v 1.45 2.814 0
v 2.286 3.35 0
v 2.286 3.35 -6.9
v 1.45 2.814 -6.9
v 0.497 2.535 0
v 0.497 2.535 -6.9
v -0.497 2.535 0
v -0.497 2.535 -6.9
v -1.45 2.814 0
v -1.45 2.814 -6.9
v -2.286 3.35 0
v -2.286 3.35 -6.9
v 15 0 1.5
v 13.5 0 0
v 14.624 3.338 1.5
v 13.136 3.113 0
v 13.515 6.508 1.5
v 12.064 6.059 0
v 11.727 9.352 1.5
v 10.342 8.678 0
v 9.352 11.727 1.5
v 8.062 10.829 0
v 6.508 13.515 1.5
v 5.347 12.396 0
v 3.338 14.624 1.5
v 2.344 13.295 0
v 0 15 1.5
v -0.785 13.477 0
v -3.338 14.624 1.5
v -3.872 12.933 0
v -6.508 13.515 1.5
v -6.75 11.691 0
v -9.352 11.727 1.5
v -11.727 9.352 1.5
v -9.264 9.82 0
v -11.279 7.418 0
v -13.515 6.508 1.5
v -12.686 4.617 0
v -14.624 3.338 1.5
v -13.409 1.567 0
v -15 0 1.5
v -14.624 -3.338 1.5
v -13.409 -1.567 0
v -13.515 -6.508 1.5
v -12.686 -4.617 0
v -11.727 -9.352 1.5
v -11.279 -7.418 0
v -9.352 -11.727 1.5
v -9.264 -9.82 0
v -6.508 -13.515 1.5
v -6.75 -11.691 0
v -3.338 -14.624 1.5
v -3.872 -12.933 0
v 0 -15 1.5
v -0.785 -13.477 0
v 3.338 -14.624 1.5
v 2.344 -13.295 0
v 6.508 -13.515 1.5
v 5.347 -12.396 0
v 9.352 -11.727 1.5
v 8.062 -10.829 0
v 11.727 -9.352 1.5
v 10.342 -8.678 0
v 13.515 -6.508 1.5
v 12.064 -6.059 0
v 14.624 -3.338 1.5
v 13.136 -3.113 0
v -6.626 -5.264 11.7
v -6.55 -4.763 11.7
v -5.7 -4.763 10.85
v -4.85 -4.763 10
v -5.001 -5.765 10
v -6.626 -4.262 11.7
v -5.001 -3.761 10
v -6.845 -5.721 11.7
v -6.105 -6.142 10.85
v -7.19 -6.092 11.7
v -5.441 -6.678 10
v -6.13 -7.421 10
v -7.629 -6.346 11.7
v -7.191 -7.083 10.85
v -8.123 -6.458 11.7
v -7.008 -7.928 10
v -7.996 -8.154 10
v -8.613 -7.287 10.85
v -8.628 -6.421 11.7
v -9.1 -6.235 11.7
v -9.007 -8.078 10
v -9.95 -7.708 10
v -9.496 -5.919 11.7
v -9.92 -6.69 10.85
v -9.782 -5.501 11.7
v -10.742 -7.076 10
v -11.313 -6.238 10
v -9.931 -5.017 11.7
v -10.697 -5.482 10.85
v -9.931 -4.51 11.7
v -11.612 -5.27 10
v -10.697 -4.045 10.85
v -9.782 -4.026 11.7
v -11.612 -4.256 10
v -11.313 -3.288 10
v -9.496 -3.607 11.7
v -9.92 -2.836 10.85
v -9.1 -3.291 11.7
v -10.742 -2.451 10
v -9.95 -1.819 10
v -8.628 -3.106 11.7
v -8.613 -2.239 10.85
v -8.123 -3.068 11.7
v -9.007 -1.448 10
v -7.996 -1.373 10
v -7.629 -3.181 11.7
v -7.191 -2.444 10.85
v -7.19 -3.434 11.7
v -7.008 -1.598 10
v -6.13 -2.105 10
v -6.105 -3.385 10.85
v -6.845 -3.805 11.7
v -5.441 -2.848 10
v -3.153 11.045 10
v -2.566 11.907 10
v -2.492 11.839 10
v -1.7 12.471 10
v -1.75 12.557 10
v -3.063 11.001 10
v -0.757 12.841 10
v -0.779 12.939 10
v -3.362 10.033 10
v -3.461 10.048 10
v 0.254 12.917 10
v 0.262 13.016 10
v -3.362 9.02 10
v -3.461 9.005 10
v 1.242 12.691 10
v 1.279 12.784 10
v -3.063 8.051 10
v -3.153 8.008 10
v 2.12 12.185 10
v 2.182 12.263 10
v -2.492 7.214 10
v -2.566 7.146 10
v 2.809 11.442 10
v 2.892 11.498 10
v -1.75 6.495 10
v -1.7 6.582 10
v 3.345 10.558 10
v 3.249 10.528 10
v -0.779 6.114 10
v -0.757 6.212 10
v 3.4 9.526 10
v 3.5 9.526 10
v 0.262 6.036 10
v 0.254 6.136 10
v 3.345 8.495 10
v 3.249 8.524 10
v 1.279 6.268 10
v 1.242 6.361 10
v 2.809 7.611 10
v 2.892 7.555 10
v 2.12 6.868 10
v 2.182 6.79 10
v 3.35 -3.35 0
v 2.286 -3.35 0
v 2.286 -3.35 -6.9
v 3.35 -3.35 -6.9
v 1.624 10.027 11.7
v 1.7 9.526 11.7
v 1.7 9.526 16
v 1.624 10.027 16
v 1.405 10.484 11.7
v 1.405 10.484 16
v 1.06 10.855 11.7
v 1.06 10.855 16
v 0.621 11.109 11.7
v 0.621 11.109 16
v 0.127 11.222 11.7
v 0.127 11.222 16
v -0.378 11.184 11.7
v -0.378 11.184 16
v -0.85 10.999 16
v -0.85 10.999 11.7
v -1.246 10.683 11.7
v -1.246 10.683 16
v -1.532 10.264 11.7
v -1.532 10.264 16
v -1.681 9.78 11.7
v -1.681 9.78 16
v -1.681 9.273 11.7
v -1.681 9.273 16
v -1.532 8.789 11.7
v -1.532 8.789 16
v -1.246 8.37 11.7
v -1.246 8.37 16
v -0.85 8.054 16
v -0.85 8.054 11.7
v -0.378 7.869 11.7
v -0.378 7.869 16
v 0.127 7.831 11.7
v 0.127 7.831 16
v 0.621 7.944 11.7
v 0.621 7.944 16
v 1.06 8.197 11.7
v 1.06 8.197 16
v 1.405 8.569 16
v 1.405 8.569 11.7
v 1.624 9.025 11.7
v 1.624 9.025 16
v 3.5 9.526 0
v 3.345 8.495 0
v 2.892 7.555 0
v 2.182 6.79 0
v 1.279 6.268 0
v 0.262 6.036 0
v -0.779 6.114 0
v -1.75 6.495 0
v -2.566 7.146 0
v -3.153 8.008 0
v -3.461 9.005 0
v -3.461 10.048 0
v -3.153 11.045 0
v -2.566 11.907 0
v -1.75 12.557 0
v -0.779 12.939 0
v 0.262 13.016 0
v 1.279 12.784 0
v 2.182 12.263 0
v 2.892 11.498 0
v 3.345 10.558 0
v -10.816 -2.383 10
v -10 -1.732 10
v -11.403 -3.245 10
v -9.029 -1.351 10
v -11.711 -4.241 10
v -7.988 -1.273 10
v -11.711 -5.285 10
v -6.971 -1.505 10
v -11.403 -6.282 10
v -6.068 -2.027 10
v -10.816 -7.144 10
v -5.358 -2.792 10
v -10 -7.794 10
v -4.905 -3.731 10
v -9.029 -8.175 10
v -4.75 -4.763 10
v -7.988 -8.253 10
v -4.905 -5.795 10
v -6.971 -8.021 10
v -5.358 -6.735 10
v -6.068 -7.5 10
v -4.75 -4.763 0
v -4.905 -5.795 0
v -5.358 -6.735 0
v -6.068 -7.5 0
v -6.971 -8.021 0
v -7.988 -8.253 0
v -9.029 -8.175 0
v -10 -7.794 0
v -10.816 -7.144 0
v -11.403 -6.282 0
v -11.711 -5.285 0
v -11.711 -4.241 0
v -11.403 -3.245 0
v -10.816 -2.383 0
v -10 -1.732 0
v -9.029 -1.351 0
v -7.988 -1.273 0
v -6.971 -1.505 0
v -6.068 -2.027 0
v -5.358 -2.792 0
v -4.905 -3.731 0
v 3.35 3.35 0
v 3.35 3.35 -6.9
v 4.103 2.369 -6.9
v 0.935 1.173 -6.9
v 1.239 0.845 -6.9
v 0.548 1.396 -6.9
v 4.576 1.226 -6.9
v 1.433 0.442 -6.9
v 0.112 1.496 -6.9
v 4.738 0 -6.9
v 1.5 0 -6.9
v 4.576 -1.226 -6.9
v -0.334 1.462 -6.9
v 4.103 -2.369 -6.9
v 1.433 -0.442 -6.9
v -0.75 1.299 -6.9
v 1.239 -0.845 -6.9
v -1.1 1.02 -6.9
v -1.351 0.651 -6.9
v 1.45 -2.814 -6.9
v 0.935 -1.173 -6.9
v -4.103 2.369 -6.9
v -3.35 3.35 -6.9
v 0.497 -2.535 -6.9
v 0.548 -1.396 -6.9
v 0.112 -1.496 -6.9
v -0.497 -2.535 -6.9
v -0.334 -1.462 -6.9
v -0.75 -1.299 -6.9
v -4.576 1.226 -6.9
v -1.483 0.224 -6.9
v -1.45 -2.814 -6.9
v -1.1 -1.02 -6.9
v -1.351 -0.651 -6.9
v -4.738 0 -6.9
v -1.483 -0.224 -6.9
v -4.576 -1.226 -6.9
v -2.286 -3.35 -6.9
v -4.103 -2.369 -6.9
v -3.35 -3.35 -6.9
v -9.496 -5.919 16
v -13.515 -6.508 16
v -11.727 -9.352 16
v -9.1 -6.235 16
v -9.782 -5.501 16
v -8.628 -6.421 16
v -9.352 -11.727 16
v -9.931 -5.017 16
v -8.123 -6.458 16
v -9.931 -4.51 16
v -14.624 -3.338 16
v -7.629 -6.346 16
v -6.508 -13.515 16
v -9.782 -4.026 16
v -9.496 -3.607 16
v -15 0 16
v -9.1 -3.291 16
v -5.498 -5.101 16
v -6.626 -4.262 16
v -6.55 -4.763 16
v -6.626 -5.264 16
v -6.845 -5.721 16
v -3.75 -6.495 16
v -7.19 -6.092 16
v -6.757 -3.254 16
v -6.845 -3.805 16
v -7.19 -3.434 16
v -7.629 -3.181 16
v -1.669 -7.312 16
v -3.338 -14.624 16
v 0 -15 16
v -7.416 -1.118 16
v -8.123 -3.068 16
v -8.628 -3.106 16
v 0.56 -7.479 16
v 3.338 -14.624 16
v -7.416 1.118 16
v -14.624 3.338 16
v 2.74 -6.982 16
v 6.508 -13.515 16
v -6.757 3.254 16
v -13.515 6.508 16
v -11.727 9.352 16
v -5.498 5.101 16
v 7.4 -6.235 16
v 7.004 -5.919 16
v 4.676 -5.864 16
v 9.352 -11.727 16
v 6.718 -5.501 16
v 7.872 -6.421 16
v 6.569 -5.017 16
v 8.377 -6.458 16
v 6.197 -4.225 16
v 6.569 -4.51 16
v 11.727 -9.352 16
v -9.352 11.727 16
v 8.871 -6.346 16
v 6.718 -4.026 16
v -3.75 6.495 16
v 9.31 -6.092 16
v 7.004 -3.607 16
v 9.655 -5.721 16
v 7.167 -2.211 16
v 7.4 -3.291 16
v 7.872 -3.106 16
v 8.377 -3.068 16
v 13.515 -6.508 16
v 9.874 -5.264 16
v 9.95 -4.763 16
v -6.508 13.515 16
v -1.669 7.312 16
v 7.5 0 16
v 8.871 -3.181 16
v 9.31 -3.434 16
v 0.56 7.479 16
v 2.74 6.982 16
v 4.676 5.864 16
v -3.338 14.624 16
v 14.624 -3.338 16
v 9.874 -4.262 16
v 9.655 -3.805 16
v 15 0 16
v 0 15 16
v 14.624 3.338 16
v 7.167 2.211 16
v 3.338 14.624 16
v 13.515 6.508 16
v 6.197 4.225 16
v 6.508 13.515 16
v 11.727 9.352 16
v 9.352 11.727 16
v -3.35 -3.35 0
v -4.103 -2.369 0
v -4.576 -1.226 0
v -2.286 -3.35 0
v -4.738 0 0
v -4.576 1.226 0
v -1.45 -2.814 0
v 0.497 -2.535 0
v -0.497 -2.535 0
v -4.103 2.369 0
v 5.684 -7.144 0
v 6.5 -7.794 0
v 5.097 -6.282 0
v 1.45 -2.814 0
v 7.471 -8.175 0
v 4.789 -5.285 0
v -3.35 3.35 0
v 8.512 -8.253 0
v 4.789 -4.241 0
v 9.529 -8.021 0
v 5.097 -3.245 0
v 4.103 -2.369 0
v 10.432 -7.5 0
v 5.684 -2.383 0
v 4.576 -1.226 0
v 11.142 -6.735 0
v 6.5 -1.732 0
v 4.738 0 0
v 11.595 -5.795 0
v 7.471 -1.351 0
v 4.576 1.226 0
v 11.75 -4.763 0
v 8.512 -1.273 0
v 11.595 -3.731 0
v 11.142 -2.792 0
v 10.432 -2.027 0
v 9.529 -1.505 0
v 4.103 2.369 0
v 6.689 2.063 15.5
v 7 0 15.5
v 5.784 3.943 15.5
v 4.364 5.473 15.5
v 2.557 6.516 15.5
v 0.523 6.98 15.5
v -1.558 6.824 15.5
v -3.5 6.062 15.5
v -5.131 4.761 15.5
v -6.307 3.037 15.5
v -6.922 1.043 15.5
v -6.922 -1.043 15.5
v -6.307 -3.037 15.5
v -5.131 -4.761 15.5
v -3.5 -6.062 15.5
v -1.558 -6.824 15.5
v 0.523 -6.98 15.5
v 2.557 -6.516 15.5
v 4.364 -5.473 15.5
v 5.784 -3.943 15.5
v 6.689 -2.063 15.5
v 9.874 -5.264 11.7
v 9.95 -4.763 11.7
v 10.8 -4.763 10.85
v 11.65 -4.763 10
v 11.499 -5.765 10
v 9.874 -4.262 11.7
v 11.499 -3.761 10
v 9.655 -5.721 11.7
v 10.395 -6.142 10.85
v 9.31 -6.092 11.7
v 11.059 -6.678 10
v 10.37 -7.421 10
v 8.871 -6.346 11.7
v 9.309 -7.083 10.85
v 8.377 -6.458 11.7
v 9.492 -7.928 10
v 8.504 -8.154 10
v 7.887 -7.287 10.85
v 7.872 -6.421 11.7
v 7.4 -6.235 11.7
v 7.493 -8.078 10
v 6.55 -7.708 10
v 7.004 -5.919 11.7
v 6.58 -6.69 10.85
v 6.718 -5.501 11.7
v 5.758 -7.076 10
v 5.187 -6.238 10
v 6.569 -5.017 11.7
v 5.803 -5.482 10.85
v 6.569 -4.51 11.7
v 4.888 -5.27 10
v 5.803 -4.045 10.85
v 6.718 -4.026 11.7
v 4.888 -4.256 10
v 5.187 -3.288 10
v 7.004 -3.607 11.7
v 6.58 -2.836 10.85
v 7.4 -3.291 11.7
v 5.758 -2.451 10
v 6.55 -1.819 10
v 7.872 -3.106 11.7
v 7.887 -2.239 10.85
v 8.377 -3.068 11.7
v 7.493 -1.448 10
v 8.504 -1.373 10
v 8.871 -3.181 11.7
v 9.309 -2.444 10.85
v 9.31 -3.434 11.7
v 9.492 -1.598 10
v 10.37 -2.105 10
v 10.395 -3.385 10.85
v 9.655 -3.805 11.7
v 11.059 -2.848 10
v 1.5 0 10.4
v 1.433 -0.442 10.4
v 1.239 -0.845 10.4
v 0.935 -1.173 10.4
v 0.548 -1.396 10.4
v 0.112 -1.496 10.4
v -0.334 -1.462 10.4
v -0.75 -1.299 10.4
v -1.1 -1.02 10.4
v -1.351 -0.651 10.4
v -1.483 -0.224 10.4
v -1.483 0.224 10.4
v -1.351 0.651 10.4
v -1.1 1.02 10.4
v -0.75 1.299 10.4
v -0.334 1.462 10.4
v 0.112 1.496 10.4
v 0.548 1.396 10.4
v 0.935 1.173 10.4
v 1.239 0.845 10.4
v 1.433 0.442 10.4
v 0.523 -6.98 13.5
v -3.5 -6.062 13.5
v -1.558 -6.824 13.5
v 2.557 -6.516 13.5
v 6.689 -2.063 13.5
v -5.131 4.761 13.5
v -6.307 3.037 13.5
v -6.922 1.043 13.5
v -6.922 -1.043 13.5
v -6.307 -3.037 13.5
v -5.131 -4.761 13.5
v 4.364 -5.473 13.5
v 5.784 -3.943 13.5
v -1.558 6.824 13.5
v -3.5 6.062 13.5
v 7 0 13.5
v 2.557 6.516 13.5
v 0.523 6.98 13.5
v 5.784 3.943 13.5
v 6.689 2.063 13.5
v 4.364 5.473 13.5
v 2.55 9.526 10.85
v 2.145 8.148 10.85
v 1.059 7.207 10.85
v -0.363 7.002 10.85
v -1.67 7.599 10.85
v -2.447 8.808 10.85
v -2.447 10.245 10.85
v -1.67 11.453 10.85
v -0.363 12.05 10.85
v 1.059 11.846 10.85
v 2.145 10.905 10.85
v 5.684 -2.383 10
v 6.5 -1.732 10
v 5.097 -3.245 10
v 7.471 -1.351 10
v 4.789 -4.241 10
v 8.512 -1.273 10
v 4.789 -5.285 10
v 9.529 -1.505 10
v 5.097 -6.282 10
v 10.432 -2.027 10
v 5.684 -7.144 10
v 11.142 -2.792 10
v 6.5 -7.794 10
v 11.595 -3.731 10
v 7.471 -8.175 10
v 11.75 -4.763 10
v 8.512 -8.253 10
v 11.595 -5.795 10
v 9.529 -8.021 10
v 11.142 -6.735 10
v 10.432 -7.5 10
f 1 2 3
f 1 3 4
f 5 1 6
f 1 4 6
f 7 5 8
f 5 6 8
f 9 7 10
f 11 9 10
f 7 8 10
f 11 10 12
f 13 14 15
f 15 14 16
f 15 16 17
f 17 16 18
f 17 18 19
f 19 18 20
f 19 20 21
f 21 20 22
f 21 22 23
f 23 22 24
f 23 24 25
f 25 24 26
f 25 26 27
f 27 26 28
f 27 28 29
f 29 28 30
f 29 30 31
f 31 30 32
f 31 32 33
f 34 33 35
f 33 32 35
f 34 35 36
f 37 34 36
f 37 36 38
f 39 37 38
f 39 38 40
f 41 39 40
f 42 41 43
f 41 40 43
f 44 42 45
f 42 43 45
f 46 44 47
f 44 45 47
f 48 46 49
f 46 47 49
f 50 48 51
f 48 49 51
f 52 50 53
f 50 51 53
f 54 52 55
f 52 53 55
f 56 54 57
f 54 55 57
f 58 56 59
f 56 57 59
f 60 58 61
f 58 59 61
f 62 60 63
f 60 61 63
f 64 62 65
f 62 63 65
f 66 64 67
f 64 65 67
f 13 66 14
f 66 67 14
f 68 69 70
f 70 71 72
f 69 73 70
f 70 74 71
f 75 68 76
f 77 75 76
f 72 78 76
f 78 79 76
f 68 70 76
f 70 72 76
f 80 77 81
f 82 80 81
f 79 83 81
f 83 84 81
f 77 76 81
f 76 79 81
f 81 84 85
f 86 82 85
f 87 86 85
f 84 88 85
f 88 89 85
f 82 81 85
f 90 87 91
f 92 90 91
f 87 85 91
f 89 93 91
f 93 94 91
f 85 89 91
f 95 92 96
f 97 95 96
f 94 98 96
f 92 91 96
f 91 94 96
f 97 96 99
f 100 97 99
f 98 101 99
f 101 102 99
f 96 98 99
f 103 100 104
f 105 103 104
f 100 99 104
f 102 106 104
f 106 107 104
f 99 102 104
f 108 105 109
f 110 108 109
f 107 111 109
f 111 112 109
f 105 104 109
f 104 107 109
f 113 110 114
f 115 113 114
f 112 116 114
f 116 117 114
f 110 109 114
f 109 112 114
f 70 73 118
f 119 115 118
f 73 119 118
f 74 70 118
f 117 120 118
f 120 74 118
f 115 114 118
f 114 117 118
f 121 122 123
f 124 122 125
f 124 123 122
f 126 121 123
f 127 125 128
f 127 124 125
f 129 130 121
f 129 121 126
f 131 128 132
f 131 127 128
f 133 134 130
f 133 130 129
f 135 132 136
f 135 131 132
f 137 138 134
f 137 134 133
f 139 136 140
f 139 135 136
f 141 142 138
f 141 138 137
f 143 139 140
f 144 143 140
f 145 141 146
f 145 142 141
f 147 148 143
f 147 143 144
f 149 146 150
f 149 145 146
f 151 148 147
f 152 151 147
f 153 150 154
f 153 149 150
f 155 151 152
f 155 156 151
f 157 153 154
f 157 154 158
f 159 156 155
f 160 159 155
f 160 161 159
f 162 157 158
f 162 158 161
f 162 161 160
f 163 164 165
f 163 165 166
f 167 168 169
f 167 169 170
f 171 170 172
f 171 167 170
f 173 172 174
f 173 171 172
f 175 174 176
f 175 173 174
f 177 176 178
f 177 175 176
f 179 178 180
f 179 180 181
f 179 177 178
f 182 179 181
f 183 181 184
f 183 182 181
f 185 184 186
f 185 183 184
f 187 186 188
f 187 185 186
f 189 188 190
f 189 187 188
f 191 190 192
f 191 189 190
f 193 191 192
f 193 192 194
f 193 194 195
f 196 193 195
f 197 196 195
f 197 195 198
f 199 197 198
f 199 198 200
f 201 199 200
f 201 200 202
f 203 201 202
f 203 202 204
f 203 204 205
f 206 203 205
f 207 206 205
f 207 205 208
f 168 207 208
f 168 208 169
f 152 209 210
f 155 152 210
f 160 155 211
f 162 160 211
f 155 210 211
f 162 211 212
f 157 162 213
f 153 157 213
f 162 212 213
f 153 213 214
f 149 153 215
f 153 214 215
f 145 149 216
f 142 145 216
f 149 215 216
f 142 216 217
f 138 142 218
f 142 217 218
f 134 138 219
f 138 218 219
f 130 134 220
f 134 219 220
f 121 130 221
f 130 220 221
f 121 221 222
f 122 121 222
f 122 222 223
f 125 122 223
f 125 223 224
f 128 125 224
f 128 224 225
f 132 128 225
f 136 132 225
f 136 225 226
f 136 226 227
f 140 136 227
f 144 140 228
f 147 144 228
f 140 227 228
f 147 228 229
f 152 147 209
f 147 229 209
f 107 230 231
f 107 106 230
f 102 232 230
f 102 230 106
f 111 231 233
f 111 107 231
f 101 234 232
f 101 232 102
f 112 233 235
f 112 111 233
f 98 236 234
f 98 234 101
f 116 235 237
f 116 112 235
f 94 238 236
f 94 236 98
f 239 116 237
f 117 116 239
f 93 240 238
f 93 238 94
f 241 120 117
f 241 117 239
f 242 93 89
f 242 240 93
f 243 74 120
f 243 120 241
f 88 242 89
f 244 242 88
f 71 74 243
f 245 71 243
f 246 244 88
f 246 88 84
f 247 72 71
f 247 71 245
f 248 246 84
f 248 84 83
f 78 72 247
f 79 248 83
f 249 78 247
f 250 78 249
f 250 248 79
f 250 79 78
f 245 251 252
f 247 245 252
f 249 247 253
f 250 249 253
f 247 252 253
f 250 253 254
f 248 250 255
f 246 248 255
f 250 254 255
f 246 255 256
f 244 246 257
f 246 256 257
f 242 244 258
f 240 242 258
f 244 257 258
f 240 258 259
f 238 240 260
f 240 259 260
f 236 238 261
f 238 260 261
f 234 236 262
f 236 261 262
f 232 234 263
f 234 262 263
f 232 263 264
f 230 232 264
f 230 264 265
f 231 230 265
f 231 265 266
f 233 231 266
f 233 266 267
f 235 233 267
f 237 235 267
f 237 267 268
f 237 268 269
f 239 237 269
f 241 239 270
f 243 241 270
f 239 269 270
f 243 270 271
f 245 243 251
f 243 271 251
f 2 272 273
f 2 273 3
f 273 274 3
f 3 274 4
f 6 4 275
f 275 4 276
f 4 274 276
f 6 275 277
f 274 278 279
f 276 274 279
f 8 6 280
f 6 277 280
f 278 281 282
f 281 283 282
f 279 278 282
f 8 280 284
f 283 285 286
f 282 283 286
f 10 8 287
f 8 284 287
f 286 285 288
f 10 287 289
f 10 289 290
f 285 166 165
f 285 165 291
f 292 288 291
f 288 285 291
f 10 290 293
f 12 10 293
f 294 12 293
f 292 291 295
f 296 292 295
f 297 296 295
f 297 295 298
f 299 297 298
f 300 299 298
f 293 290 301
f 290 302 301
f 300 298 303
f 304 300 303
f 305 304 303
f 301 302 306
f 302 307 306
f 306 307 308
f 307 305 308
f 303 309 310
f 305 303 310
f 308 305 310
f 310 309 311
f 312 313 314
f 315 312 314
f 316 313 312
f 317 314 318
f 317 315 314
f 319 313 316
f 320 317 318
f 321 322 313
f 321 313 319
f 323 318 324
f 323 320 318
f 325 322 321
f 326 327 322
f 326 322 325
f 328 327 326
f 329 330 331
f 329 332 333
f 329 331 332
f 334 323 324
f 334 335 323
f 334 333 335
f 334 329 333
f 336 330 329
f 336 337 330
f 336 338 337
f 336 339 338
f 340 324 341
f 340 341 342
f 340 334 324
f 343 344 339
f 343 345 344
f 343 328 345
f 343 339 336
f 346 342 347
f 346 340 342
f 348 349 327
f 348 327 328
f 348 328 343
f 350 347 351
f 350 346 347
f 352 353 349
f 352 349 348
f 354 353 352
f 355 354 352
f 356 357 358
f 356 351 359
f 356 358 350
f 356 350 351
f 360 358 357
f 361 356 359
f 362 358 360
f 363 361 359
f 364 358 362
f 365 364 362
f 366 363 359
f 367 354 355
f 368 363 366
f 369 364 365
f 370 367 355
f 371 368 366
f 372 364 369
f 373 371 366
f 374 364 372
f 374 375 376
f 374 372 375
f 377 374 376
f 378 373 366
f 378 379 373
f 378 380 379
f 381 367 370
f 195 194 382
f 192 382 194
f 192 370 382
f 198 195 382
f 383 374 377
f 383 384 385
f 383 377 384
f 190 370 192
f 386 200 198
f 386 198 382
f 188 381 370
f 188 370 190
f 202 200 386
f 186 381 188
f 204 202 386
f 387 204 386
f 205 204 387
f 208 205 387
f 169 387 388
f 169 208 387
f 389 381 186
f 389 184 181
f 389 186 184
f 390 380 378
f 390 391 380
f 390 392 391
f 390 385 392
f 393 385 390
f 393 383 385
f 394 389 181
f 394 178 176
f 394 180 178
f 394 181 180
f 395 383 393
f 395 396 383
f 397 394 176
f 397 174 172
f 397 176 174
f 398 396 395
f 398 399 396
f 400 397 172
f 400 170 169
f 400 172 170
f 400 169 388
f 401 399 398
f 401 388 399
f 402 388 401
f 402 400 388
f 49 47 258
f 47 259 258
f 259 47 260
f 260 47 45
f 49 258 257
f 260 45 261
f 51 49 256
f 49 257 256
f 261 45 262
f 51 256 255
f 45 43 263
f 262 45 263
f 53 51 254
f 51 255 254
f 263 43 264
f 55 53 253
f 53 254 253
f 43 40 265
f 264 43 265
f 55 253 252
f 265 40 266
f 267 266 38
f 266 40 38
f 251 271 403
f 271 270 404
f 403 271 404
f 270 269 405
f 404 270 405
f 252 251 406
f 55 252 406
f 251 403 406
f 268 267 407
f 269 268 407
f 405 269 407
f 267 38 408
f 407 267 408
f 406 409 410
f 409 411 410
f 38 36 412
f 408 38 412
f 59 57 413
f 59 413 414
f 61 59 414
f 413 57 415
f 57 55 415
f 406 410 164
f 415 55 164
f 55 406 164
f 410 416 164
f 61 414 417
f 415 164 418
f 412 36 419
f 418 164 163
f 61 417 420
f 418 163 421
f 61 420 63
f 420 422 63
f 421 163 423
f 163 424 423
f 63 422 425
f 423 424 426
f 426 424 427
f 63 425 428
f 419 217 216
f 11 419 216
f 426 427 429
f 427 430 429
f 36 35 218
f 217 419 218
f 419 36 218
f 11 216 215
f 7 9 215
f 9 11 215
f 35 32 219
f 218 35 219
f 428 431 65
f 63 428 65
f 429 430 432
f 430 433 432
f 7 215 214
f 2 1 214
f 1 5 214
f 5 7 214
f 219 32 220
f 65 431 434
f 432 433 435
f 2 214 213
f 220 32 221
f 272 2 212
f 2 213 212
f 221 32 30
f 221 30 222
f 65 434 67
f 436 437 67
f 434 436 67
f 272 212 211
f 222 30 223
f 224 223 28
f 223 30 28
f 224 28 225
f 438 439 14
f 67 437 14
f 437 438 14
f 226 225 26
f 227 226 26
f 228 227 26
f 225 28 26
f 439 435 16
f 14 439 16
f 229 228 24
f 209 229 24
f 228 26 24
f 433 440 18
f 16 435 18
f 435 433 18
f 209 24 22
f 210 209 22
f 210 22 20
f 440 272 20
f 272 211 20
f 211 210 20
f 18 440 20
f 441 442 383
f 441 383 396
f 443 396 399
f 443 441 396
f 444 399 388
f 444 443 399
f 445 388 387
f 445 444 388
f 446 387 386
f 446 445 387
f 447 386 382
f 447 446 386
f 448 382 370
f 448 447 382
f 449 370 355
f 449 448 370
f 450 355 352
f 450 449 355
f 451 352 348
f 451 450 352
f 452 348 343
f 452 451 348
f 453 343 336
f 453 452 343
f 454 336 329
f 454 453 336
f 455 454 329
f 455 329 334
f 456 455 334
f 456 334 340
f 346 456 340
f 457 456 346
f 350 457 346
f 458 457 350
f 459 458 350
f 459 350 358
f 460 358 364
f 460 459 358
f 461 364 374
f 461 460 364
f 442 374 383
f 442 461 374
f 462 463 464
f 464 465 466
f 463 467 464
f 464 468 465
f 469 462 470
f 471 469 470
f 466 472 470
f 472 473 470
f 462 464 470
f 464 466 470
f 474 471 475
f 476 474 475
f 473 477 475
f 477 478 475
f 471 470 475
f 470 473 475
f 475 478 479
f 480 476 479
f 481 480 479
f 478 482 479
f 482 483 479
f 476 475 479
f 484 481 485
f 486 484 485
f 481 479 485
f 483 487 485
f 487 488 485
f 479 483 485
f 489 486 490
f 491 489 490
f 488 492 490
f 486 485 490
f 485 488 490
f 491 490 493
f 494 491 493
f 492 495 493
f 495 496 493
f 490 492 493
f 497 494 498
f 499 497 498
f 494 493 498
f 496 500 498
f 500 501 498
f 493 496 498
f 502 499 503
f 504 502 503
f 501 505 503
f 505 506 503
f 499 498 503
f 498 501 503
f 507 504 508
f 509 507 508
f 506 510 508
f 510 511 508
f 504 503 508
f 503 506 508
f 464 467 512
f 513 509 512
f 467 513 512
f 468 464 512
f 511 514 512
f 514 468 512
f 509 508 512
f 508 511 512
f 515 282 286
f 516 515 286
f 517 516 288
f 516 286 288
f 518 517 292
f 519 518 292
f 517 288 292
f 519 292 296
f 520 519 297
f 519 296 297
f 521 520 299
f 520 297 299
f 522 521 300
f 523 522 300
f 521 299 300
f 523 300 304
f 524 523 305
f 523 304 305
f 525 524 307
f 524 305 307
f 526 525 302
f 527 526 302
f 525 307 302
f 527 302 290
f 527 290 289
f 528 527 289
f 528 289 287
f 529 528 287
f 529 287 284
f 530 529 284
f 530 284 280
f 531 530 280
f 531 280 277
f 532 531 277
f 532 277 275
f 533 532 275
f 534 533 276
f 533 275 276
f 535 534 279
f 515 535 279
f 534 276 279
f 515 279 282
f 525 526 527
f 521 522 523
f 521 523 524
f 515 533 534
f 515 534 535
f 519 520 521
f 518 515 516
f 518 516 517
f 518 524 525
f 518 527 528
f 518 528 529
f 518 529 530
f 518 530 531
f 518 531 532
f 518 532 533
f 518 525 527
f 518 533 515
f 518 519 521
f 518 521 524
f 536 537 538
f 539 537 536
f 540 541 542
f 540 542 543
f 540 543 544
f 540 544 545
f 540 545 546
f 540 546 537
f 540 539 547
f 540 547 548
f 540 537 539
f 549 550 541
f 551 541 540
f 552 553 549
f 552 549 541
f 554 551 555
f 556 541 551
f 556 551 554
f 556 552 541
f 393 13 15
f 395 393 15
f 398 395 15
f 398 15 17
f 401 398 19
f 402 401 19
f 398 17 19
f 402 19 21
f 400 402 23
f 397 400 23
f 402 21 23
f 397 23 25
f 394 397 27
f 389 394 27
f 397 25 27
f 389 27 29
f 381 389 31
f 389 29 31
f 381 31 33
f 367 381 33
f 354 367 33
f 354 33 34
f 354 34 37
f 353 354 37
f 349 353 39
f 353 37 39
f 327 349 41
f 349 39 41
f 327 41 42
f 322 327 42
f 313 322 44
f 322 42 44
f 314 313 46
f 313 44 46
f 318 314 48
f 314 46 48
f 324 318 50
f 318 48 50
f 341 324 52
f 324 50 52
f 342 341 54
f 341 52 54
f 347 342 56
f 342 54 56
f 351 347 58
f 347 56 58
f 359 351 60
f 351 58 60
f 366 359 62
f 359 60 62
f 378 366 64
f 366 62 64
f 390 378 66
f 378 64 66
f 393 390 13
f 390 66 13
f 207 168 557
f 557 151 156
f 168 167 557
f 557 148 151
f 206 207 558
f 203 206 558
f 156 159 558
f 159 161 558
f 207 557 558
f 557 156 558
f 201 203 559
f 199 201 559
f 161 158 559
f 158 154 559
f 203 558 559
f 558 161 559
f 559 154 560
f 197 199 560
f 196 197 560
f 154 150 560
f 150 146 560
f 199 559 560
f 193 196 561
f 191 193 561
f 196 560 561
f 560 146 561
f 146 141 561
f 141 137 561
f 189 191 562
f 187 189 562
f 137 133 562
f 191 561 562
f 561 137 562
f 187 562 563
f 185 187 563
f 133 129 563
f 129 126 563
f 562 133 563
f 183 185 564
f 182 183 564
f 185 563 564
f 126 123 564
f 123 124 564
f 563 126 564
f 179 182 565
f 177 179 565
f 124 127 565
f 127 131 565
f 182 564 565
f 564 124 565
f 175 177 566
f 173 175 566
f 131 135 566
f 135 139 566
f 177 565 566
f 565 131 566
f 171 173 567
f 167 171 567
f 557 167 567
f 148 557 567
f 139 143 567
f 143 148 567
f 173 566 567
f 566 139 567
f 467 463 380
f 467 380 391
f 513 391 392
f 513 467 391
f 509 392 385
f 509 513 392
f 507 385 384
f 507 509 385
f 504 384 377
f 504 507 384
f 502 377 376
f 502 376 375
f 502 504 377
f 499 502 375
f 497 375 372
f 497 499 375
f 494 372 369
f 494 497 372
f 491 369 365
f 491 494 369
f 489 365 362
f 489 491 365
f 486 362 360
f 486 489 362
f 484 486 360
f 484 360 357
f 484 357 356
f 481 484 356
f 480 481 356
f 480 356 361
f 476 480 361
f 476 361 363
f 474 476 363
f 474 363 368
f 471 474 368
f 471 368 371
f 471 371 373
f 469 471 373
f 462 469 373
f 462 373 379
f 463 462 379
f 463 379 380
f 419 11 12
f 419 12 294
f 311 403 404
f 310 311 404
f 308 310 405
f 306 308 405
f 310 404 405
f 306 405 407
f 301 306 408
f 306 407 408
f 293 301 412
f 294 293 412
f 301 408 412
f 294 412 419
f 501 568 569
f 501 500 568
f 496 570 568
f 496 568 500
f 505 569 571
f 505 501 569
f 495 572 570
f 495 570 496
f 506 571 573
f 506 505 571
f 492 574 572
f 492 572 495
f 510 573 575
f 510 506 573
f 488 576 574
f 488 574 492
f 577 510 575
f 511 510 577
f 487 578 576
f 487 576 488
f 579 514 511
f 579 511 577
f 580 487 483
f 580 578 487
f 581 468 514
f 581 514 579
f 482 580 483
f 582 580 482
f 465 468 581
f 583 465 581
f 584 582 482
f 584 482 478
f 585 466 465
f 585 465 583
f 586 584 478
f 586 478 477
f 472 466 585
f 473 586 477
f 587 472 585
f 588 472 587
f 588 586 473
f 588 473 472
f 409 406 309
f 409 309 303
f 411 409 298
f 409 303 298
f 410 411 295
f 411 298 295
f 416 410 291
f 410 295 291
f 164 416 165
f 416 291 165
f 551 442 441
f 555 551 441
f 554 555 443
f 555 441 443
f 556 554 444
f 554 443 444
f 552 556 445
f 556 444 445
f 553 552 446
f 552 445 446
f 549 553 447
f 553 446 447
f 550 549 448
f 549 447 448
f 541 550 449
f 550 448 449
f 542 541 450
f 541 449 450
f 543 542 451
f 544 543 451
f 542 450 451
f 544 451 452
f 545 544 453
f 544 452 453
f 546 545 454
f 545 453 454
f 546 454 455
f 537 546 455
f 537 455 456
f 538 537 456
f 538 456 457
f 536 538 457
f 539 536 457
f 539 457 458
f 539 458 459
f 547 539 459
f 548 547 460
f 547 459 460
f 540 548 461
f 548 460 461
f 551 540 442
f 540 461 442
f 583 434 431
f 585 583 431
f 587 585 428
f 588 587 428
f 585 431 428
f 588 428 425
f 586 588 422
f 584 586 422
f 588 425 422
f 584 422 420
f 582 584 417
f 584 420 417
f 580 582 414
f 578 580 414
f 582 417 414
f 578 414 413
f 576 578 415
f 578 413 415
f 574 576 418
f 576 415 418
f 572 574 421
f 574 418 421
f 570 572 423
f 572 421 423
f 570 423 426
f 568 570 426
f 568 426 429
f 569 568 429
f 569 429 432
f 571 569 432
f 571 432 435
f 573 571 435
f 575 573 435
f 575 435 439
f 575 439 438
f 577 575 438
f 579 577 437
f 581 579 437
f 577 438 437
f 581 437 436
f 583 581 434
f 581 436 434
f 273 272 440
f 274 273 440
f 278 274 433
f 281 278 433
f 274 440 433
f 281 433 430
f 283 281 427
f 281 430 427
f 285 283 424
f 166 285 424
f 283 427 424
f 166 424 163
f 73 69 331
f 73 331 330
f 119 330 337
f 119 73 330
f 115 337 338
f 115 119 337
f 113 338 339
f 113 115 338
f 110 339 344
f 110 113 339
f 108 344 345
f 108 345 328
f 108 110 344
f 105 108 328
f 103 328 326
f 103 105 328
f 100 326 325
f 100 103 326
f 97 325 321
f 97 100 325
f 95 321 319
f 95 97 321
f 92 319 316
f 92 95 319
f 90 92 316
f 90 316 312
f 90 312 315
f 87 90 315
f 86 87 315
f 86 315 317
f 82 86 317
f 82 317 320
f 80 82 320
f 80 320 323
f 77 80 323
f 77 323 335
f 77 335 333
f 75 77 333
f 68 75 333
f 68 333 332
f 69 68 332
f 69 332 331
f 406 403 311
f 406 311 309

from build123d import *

# Parameters (mm, degrees)
SKETCH_R        = 15
SKETCH_R_2      = 1.7
PAD_DEPTH       = 16
PAD001_DEPTH    = 6.9
SKETCH006_R     = 3.5
POCKET003_DEPTH = 6.9
SKETCH003_R     = 1.5
POCKET004_DEPTH = 17.3
SKETCH008_R     = 7
POCKET_DEPTH    = 2.5
SKETCH009_R     = 3.5
POCKET005_DEPTH = 10
CHAMFER_SIZE    = 1.5
CHAMFER001_SIZE = 1.7
CHAMFER002_SIZE = 1.7
CHAMFER003_SIZE = 1.7
CHAMFER004_SIZE = 0.5


with BuildPart() as part:
    # Sketch → Pad (new body)
    with BuildSketch(Plane.XY):
        Circle(SKETCH_R)
        with Locations((0, 9.526279)):
            Circle(SKETCH_R_2, mode=Mode.SUBTRACT)
        with Locations((-8.25, -4.76314)):
            Circle(SKETCH_R_2, mode=Mode.SUBTRACT)
        with Locations((8.25, -4.76314)):
            Circle(SKETCH_R_2, mode=Mode.SUBTRACT)
    extrude(amount=PAD_DEPTH)

    # Sketch004 → Pad001 (new body)
    with BuildSketch(Plane(origin=(0, 0, 0), x_dir=(1, 0, 0), z_dir=(0, 0, -1))):
        with BuildLine():
            Line((-3.35, 3.35), (3.35, 3.35))
            ThreePointArc((3.35, -3.35), (4.737615, 0), (3.35, 3.35))
            Line((3.35, -3.35), (-3.35, -3.35))
            ThreePointArc((-3.35, 3.35), (-4.737615, 0), (-3.35, -3.35))
        make_face()
    extrude(amount=PAD001_DEPTH)

    # Sketch006 → Pocket003 (cut)
    with BuildSketch(Plane(origin=(0, 0, -6.9), x_dir=(1, 0, 0), z_dir=(0, 0, -1))):
        with Locations((0, 6)):
            Circle(SKETCH006_R)
        with Locations((0, -6)):
            Circle(SKETCH006_R)
    extrude(amount=-POCKET003_DEPTH, mode=Mode.SUBTRACT)

    # Sketch003 → Pocket004 (cut)
    with BuildSketch(Plane(origin=(0, 0, -6.9), x_dir=(1, 0, 0), z_dir=(0, 0, -1))):
        Circle(SKETCH003_R)
    extrude(amount=-POCKET004_DEPTH, mode=Mode.SUBTRACT)

    # Sketch008 → Pocket (cut)
    with BuildSketch(Plane.XY.offset(16)):
        Circle(SKETCH008_R)
    extrude(amount=-POCKET_DEPTH, mode=Mode.SUBTRACT)

    # Sketch009 → Pocket005 (cut)
    with BuildSketch(Plane(origin=(0, 0, 0), x_dir=(1, 0, 0), z_dir=(0, 0, -1))):
        with Locations((8.25, 4.76314)):
            Circle(SKETCH009_R)
        with Locations((-8.25, 4.76314)):
            Circle(SKETCH009_R)
        with Locations((0, -9.526279)):
            Circle(SKETCH009_R)
    extrude(amount=-POCKET005_DEPTH, mode=Mode.SUBTRACT)

    # Chamfer
    chamfer_edges = [part.edges().sort_by_distance(p)[0] for p in [
        (-15, 0, 0),
    ]]
    chamfer(chamfer_edges, length=CHAMFER_SIZE)

    # Chamfer001
    chamfer001_edges = [part.edges().sort_by_distance(p)[0] for p in [
        (-9.95, -4.76314, 10),
    ]]
    chamfer(chamfer001_edges, length=CHAMFER001_SIZE)

    # Chamfer002
    chamfer002_edges = [part.edges().sort_by_distance(p)[0] for p in [
        (6.55, -4.76314, 10),
    ]]
    chamfer(chamfer002_edges, length=CHAMFER002_SIZE)

    # Chamfer003
    chamfer003_edges = [part.edges().sort_by_distance(p)[0] for p in [
        (-1.7, 9.526279, 10),
    ]]
    chamfer(chamfer003_edges, length=CHAMFER003_SIZE)

    # Chamfer004
    chamfer004_edges = [part.edges().sort_by_distance(p)[0] for p in [
        (-7, 0, 16),
    ]]
    chamfer(chamfer004_edges, length=CHAMFER004_SIZE)


solid = part.part
